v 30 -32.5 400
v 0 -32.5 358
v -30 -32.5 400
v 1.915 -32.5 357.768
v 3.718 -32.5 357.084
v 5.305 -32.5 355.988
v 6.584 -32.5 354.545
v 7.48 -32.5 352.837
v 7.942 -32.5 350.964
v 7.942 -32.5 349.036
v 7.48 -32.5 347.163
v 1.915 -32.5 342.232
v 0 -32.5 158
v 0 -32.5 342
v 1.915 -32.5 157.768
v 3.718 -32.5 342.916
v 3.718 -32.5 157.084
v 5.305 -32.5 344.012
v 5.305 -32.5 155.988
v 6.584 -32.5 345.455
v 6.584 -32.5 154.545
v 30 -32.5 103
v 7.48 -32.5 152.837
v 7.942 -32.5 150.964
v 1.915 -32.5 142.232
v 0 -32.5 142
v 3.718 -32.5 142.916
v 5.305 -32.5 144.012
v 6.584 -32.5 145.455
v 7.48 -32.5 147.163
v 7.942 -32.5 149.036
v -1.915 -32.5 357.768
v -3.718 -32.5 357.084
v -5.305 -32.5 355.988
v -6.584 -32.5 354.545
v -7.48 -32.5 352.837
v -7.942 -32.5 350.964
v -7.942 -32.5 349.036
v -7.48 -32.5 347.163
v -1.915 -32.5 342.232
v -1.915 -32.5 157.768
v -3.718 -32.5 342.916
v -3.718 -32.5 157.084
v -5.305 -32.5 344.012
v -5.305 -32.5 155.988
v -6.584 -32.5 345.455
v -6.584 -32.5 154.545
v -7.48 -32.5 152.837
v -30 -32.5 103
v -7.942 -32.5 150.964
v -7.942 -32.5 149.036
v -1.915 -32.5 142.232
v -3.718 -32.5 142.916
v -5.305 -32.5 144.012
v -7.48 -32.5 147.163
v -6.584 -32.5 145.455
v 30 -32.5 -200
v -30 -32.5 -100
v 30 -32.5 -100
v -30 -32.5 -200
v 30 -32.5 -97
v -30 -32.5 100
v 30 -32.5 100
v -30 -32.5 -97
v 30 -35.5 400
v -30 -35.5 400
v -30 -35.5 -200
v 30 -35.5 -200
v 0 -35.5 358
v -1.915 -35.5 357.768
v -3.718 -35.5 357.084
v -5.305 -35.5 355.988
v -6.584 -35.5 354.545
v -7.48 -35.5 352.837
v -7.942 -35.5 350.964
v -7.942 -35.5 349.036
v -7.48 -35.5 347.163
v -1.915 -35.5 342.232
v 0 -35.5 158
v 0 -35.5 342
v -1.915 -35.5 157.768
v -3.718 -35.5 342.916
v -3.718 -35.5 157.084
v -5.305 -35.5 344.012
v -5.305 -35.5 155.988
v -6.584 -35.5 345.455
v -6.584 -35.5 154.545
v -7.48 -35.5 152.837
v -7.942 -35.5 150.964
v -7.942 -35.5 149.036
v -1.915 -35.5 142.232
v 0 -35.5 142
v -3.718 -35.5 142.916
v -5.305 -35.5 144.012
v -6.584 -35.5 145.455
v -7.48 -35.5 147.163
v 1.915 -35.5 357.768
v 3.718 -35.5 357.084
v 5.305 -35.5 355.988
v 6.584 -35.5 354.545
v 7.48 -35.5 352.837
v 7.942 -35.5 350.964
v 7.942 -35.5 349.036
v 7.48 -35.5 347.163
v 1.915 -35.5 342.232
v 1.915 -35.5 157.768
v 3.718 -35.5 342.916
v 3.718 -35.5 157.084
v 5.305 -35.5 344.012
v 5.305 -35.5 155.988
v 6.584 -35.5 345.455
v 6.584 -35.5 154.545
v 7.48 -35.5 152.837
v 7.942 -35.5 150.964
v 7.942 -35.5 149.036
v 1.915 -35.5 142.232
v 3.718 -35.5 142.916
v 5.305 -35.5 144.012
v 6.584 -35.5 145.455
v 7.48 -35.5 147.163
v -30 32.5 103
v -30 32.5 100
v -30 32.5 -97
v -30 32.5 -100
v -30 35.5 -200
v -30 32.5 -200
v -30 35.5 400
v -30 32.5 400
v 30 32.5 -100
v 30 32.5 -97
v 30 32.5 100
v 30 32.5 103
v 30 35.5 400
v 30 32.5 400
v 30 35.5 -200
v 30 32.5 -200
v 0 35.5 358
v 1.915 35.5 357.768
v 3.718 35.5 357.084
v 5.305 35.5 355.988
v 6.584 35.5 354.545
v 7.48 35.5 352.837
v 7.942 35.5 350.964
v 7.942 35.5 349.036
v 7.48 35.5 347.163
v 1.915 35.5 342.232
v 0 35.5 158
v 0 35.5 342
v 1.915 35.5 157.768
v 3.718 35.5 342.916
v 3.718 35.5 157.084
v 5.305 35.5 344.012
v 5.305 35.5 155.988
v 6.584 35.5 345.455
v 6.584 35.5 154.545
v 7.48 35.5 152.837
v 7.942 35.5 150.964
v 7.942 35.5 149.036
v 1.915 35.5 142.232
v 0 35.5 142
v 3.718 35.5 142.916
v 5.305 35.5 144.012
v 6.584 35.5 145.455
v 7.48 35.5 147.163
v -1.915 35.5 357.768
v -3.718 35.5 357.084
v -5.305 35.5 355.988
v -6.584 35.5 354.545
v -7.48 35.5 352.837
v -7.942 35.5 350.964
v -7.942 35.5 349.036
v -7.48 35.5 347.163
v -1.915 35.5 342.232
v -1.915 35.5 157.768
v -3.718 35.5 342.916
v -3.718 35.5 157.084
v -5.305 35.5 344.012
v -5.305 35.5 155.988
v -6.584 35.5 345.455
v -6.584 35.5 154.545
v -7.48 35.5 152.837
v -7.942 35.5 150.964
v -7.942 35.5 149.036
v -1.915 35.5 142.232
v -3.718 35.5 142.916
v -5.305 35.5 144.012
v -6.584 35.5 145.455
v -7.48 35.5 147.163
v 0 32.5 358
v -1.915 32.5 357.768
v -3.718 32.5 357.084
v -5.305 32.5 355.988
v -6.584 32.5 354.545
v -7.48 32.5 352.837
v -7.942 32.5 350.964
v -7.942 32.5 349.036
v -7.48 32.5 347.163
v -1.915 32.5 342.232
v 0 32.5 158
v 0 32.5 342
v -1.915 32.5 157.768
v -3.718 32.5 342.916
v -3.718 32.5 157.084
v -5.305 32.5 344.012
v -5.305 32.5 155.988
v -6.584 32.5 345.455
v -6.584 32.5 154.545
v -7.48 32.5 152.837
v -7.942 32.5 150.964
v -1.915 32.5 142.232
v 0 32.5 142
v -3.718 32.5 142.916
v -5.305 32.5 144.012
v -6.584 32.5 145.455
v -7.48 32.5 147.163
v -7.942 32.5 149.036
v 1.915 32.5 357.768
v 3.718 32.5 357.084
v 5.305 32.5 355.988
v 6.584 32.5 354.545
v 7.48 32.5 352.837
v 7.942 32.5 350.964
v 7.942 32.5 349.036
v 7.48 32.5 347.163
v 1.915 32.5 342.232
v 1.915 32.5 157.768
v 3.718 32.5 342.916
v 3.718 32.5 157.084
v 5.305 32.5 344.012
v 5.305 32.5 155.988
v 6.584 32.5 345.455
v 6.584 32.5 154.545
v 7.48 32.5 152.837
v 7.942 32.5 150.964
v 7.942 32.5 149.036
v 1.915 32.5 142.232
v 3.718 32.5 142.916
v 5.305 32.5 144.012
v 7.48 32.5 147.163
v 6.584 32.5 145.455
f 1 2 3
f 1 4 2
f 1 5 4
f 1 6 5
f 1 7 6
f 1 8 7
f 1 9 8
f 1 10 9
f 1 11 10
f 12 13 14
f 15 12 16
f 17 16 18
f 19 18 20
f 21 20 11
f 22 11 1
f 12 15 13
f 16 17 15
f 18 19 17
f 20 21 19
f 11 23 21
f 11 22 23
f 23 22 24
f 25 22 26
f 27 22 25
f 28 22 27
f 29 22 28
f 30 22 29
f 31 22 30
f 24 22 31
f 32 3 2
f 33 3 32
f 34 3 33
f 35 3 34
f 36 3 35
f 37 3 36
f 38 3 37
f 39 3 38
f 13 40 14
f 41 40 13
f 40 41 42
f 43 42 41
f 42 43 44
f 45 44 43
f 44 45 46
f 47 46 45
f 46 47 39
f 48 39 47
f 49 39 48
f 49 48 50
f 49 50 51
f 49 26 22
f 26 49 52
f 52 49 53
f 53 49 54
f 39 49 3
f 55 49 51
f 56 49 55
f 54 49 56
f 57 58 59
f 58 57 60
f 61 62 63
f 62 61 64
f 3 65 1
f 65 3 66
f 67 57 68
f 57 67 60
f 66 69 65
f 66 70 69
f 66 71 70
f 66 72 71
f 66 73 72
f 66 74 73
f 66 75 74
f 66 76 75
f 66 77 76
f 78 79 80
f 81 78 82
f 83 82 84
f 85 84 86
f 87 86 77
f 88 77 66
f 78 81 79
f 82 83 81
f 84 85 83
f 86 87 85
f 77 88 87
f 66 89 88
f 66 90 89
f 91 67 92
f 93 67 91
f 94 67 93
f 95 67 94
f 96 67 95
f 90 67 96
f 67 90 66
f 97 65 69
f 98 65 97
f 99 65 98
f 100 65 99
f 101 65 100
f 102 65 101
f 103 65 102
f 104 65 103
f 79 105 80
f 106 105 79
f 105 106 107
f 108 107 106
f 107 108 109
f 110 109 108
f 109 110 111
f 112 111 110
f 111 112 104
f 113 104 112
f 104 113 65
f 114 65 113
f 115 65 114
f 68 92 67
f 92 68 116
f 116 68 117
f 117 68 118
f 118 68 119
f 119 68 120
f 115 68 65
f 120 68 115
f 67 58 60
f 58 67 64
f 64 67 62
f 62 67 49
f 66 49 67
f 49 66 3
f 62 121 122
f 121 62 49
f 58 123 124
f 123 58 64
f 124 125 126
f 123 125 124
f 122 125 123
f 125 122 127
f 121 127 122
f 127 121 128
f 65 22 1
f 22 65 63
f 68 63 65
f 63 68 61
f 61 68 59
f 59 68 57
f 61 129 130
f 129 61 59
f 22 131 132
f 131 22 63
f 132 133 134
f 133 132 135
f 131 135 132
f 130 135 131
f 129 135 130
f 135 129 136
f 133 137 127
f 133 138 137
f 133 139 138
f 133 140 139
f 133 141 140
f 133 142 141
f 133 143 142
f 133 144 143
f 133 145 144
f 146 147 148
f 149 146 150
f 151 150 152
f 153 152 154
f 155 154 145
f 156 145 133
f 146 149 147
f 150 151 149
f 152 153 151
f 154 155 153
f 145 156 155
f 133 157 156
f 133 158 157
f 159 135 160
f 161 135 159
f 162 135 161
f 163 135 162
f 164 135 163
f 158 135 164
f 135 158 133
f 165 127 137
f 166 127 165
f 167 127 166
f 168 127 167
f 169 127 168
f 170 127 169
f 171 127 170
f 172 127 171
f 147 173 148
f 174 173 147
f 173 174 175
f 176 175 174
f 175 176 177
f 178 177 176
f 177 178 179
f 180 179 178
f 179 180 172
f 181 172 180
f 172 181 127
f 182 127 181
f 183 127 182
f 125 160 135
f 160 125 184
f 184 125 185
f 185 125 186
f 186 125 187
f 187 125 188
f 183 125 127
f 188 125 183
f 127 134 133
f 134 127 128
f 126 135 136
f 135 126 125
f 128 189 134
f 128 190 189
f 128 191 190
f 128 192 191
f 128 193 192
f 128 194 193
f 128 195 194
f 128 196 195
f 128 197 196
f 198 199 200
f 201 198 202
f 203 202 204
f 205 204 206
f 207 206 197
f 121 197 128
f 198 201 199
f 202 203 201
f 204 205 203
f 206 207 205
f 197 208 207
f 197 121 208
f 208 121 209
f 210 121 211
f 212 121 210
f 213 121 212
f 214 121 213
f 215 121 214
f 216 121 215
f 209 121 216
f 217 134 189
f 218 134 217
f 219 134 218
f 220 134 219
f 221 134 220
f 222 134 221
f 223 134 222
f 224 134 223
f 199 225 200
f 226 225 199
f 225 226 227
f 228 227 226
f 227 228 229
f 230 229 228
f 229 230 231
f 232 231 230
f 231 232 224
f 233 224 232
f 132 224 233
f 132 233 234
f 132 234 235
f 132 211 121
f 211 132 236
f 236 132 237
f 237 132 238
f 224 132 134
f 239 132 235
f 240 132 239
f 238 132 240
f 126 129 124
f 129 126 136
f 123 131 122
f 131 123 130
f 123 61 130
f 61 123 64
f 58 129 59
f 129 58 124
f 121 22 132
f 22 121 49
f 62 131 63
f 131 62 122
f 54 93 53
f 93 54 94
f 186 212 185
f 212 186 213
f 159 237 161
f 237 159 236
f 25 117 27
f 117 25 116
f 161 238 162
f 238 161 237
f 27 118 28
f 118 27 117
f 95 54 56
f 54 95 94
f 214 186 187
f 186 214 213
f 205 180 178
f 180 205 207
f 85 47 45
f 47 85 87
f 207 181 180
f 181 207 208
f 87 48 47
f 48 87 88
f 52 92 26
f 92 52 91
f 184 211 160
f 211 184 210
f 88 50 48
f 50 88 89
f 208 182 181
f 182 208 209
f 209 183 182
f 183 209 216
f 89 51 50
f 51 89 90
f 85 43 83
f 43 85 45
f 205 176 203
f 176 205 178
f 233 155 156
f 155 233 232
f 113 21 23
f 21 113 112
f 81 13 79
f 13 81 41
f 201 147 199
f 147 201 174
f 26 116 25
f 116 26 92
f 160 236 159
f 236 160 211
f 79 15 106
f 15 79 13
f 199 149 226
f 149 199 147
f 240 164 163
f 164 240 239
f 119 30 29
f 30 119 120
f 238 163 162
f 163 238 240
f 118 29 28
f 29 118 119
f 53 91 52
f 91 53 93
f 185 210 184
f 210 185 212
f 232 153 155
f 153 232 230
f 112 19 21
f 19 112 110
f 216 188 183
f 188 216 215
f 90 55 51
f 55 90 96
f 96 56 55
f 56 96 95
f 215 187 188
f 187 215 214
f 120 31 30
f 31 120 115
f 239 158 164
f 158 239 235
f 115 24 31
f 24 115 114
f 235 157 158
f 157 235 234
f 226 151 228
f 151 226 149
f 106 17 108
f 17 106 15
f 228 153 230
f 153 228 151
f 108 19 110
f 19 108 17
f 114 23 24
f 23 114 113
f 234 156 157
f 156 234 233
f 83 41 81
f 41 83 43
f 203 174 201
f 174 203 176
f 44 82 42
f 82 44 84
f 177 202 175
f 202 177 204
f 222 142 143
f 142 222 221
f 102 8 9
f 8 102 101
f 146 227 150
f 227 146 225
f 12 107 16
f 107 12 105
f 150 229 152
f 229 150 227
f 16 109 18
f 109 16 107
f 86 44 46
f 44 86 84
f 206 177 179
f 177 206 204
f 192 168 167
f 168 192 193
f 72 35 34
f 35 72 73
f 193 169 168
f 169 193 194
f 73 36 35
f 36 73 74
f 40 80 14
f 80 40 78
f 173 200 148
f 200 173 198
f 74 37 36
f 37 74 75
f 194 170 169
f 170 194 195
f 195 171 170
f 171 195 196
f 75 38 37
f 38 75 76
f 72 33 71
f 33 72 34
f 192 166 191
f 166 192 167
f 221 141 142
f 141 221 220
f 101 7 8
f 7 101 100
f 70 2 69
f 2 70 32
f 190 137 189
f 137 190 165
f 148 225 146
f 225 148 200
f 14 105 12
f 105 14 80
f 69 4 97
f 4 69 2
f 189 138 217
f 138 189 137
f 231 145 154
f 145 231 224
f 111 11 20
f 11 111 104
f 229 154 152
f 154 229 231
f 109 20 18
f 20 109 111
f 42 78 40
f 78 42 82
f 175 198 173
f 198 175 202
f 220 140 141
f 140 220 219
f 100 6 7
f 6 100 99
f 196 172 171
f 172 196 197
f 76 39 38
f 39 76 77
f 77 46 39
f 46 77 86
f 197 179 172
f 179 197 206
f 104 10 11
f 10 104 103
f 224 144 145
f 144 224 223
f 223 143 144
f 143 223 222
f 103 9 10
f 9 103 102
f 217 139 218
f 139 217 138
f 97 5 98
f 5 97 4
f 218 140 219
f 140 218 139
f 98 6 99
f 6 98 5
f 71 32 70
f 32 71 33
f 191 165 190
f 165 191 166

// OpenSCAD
total_height = 600;
total_width = 71;
total_depth = 60;
thickness = 3;
height_lower_beam = 100;
height_upper_beam = 300;
height_of_lower_hole = 350;
height_of_upper_hole = 550;
diameter_of_hole = 8;

module beam(){
    cube([total_width, total_depth, thickness]);
}

module h_post_anchor(){
    color ("silver")
    rotate([0,0,90])
    translate ([
        -total_width/2,
        -total_depth/2,
        -(height_of_upper_hole-height_of_lower_hole)
    ])
    difference(){
        union(){
            cube([thickness, total_depth, total_height]);
            translate([total_width-thickness,0,0])
                cube([thickness, total_depth, total_height]);
            
            translate([0,0,height_lower_beam])
                beam();
            translate([0,0,height_upper_beam])
                beam();
        }
        translate([0, total_depth/2, height_of_lower_hole])
            rotate([0,90,0])
                cylinder(total_width, diameter_of_hole,diameter_of_hole);
        translate([0, total_depth/2, height_of_upper_hole])
            rotate([0,90,0])
                cylinder(total_width, diameter_of_hole,diameter_of_hole);
    }   
}
h_post_anchor();
//pole();
//point_foundation();
